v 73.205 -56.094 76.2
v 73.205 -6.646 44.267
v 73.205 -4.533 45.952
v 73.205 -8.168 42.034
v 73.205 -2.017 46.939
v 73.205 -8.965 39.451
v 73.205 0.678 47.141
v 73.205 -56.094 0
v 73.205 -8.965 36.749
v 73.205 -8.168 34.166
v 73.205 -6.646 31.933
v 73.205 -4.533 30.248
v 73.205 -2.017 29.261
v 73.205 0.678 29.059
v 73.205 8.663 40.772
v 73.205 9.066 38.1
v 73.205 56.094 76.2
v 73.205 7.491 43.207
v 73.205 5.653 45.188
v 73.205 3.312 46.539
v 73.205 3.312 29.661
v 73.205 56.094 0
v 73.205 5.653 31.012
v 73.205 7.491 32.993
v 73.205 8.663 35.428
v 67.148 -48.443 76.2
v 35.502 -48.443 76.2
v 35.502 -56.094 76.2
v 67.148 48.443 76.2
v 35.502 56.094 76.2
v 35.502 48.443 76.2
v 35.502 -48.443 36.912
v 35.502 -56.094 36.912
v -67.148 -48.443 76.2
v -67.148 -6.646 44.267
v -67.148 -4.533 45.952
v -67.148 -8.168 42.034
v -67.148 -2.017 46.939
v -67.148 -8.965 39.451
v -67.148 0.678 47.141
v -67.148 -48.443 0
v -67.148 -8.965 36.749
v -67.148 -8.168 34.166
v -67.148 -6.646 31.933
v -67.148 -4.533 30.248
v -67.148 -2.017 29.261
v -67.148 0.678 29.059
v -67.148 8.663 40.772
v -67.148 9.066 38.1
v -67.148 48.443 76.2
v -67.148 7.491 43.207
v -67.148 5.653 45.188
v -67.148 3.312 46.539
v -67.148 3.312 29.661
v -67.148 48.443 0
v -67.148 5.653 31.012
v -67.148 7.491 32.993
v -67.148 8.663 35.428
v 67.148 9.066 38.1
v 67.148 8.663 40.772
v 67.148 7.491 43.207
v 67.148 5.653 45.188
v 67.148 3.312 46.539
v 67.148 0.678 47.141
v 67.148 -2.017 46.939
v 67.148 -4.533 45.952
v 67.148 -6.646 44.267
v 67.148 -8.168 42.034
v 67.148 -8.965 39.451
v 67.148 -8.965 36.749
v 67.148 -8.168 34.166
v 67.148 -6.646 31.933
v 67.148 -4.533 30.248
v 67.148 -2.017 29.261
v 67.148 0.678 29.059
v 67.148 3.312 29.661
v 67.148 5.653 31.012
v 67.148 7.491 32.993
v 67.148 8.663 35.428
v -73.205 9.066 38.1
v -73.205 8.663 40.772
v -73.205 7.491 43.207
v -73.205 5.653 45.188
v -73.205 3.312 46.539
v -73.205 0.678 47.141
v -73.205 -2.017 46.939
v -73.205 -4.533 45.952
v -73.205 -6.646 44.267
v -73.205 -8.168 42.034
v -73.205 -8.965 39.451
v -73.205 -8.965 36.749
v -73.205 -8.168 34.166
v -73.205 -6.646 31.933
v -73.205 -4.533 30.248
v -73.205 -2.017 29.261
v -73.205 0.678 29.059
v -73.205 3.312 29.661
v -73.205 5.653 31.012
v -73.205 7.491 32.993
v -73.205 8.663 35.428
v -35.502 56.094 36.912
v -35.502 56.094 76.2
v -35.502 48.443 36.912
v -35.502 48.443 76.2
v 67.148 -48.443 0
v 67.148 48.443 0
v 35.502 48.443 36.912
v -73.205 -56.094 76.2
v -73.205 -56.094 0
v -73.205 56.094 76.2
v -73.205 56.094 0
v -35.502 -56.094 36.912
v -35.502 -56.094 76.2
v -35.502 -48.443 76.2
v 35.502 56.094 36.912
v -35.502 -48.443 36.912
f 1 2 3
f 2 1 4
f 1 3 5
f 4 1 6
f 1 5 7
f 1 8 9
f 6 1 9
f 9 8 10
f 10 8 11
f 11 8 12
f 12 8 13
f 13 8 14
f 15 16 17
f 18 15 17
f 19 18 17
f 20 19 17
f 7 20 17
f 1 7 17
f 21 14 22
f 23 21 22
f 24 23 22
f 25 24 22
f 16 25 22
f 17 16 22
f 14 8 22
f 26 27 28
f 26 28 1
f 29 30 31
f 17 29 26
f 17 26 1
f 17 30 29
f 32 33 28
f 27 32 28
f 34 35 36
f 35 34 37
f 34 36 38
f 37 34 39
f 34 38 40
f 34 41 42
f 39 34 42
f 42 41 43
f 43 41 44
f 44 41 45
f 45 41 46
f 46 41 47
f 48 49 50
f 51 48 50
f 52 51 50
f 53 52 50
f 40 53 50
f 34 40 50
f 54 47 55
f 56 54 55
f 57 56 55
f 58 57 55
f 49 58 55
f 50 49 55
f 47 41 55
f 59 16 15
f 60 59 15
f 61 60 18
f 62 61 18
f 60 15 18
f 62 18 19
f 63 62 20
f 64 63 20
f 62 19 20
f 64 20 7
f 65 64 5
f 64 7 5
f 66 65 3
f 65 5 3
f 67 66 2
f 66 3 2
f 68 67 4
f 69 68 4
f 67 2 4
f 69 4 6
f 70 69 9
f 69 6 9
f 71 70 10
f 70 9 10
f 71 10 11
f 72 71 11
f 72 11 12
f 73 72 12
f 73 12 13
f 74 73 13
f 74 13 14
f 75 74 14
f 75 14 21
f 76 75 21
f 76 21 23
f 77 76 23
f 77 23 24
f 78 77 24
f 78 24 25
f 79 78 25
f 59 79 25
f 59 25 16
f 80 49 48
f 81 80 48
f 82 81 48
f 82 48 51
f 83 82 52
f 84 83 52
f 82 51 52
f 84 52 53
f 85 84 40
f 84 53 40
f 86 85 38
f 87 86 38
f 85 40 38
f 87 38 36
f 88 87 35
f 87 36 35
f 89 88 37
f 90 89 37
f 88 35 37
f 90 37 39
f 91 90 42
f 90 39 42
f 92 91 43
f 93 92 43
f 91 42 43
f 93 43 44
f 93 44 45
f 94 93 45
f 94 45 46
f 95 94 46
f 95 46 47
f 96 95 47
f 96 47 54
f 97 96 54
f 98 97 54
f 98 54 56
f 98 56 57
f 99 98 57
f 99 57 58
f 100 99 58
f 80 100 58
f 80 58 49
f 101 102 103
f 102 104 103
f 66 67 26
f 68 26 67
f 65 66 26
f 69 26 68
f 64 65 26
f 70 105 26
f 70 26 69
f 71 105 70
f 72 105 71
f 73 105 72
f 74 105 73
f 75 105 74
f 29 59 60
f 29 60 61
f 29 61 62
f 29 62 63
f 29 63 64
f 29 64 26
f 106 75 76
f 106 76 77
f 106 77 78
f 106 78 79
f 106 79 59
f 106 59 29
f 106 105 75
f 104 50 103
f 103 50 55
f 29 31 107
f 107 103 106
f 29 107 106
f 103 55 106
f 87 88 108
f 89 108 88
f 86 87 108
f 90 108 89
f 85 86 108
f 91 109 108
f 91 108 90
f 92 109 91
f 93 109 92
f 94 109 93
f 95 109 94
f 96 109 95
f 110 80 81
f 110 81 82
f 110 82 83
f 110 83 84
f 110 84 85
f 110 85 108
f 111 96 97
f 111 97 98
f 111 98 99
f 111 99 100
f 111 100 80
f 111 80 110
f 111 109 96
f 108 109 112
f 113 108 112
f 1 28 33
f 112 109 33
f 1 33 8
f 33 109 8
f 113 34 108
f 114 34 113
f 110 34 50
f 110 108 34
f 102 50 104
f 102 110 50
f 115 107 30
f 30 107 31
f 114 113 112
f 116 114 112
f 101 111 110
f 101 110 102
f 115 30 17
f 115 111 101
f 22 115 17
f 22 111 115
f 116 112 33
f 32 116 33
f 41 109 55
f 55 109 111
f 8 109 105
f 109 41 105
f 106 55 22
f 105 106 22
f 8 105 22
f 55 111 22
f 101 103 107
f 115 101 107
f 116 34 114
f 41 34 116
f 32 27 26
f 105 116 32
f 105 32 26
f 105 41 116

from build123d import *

# Parameters (mm, degrees)
F0_W     = 146.409408
F0_H     = 112.187884
F0_W_2   = 134.296582
F0_H_2   = 96.886568
F1_DEPTH = 76.2
F2_W     = 71.00363
F2_H     = 39.288416
F3_DEPTH = 112.188885
F4_R     = 9.066192
F5_DEPTH = 146.410407


with BuildPart() as f1:
    # F0 (on Top) → F1 (new body)
    with BuildSketch(Plane.XY):
        Rectangle(F0_W, F0_H)
        Rectangle(F0_W_2, F0_H_2, mode=Mode.SUBTRACT)
    extrude(amount=F1_DEPTH)

    # F2 (on face) → F3 (cut, through all)
    with BuildSketch(Plane.XZ.offset(56.093942)):
        with Locations((0, 95.844208)):
            Rectangle(F2_W, F2_H)
        with Locations((0, 56.555792)):
            Rectangle(F2_W, F2_H)
    extrude(amount=-F3_DEPTH, mode=Mode.SUBTRACT)

    # F4 (on face) → F5 (cut, through all)
    with BuildSketch(Plane.YZ.offset(73.204704)):
        with Locations((0, 38.1)):
            Circle(F4_R)
    extrude(amount=-F5_DEPTH, mode=Mode.SUBTRACT)


solid = f1.part
